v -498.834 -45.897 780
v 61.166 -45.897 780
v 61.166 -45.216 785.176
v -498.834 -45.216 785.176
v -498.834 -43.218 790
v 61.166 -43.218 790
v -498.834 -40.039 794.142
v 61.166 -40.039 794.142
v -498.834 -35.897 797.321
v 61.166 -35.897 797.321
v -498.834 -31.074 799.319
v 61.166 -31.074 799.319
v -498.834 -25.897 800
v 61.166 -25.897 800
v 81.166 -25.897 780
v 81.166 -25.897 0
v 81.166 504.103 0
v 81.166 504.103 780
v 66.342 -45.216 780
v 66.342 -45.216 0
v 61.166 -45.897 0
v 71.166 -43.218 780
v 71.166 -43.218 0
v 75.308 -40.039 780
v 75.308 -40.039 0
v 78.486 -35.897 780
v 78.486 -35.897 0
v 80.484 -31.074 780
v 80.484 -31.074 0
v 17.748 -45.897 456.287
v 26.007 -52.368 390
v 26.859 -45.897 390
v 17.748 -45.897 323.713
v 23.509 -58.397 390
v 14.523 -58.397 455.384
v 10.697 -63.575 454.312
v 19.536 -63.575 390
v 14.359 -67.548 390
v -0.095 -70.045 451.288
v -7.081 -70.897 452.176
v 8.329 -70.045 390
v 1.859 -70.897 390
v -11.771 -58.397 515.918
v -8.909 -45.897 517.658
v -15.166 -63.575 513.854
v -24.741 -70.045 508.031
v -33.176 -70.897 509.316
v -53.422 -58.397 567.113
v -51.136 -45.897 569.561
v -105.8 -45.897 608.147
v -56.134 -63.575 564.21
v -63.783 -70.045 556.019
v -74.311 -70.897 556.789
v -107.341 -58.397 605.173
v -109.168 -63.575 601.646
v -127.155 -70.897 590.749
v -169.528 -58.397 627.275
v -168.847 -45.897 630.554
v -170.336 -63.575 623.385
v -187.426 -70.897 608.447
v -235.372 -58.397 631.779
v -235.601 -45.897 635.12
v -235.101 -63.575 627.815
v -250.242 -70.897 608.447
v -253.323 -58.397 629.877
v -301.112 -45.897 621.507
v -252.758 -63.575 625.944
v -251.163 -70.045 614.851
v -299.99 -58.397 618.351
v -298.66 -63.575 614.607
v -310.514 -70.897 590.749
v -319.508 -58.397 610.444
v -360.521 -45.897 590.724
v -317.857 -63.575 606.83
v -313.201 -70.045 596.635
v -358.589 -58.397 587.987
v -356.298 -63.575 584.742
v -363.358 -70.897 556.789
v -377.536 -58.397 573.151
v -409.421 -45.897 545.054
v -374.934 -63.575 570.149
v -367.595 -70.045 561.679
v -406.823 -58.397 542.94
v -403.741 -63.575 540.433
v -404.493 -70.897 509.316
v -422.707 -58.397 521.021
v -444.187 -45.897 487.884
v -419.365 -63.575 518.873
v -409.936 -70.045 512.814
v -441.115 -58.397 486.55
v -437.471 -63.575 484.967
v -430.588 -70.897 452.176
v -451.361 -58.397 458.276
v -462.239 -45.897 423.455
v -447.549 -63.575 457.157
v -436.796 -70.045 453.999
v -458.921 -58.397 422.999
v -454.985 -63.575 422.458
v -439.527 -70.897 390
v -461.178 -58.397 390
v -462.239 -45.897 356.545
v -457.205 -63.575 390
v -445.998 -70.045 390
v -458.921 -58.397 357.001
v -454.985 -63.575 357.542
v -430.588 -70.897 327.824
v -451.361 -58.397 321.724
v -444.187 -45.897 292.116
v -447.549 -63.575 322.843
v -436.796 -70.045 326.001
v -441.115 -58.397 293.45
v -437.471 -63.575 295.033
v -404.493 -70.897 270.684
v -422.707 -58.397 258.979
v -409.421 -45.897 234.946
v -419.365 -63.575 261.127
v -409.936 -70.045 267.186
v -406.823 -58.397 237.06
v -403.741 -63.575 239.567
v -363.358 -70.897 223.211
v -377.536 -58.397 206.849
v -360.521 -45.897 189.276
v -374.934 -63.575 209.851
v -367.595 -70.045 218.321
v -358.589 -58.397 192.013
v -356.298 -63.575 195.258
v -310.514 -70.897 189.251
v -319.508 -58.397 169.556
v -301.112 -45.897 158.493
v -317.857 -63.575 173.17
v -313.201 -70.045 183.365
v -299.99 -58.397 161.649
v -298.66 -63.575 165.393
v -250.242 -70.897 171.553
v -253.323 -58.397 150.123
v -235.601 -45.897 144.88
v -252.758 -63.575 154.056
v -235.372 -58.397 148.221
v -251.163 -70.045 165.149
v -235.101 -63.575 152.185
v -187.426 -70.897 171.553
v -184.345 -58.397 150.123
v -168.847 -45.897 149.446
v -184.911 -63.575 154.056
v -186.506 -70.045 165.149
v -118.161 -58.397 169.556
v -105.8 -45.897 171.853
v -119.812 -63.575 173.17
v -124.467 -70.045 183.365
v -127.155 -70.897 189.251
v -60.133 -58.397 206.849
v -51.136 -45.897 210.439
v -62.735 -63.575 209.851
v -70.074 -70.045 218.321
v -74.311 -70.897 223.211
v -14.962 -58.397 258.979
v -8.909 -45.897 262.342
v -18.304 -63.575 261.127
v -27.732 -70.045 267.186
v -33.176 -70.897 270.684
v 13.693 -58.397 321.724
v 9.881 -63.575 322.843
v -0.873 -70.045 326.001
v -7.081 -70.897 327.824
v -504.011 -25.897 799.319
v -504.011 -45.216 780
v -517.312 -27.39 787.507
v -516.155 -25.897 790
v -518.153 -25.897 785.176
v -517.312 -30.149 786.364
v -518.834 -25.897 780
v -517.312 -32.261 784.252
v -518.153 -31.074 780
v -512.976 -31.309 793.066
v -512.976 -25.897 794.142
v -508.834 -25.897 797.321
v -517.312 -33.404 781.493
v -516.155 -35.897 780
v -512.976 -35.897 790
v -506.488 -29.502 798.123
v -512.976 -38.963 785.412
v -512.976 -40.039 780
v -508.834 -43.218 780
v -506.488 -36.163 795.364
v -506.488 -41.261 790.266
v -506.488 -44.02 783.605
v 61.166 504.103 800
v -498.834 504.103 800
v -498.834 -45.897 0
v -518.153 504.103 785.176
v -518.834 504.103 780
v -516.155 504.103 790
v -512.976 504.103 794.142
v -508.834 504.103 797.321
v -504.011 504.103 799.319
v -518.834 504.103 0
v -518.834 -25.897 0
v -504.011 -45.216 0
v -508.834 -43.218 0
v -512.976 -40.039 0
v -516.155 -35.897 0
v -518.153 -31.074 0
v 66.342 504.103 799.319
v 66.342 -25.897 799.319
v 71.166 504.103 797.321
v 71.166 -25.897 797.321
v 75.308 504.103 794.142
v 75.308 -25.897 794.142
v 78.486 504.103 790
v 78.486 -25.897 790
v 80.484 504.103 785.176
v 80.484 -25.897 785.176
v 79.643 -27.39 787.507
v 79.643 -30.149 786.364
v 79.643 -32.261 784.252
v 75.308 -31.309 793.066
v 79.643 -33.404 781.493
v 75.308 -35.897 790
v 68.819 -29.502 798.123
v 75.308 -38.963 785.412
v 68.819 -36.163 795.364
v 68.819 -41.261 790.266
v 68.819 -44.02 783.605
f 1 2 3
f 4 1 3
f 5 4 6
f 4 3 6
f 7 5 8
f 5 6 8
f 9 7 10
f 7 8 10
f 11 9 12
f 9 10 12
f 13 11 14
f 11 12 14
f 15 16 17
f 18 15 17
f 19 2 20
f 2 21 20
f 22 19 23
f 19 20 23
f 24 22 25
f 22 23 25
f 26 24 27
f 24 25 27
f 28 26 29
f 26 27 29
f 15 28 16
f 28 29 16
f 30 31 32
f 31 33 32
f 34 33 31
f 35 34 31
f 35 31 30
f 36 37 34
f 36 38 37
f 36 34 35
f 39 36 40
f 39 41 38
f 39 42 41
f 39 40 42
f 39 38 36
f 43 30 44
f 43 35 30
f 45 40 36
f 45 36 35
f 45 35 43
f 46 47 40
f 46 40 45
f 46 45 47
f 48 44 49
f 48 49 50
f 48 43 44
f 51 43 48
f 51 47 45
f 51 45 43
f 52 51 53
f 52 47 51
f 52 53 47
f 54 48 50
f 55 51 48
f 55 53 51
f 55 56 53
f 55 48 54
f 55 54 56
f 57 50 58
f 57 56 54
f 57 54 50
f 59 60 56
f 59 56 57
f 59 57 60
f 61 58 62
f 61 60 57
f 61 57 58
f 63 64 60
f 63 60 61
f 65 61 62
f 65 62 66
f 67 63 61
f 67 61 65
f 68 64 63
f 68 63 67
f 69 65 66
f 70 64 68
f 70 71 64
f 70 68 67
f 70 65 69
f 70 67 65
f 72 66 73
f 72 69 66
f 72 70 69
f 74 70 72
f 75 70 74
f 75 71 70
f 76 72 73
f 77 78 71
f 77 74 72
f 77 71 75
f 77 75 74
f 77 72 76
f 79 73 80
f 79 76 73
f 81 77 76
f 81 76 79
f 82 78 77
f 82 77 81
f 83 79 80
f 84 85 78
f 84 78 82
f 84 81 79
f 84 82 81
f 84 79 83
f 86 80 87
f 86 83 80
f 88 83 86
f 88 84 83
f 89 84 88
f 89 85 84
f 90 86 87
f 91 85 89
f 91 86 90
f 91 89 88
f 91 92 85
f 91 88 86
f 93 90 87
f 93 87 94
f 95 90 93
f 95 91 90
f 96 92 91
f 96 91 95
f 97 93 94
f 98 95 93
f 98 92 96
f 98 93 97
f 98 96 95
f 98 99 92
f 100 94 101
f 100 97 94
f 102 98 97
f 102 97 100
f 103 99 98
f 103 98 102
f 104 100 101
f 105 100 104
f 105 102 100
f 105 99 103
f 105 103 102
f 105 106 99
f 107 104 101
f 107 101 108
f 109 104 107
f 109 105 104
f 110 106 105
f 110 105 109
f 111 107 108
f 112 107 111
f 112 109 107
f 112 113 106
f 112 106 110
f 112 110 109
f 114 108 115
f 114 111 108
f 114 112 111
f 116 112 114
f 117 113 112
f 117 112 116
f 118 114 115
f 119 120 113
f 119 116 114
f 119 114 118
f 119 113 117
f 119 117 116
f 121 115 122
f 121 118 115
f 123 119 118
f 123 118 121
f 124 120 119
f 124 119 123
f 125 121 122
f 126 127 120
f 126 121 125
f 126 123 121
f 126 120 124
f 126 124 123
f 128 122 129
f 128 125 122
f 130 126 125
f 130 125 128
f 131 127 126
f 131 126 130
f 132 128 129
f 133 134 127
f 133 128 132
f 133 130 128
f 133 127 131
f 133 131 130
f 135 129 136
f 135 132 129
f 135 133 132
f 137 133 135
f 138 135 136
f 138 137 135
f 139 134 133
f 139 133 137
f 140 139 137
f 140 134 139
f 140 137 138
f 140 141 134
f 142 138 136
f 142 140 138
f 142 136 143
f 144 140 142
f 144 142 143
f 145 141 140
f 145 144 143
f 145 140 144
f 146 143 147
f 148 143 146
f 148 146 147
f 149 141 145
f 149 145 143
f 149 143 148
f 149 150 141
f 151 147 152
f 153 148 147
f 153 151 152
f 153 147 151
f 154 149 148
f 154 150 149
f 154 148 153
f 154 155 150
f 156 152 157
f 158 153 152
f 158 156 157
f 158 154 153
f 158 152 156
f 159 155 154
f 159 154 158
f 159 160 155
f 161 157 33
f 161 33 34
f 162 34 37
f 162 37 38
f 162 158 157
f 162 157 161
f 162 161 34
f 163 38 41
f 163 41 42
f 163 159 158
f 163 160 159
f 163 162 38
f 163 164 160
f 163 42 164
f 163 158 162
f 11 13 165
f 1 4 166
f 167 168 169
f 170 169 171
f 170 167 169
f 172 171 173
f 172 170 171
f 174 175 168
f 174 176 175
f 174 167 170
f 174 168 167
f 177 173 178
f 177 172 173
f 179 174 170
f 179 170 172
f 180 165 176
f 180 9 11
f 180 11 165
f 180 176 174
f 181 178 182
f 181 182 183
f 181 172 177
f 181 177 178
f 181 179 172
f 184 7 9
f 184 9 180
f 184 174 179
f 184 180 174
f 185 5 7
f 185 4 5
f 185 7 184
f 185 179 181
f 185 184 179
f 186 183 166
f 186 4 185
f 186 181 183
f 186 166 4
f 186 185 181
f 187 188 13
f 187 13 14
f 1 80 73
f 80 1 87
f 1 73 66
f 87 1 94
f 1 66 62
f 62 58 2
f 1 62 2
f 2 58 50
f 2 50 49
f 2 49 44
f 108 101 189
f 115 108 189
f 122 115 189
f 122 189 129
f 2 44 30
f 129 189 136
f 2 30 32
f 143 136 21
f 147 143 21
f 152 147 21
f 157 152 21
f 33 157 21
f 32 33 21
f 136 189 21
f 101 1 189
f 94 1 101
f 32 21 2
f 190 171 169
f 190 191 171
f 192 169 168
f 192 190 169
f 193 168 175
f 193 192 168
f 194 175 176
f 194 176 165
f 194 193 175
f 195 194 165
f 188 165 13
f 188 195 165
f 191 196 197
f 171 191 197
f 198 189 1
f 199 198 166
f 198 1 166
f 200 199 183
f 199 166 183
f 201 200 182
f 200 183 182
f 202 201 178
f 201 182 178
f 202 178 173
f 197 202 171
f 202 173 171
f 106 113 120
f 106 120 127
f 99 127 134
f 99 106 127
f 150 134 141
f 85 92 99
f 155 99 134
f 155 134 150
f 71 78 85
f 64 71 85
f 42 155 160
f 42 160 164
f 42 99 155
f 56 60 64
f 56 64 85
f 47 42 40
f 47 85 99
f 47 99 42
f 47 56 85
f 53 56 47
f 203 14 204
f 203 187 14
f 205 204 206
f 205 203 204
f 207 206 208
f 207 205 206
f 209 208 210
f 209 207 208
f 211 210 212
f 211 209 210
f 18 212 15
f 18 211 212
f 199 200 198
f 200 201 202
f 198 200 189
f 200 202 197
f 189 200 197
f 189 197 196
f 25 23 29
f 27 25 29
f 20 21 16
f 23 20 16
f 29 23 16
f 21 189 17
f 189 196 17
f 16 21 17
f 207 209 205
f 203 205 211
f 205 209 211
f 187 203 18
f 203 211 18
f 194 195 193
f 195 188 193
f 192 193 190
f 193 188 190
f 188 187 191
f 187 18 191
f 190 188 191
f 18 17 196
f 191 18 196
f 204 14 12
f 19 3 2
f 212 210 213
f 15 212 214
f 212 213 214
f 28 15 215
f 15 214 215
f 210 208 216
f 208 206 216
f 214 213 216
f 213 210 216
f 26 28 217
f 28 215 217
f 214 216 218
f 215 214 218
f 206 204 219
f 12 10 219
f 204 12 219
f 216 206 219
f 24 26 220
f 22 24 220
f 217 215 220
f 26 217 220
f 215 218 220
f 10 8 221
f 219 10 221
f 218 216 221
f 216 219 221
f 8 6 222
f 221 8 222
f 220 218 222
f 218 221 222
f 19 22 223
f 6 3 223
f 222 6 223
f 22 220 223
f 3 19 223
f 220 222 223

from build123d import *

# Parameters (mm, degrees)
F2_DEPTH = 700
F1_W     = 600
F1_H     = 550
F3_DEPTH = 800
F4_R     = 20
F5_R     = 245.6930164014
F6_DEPTH = 25
F7_R     = 24.99999


# Not quite as in the source:
# - a fillet or chamfer is up to 0.001 mm smaller than in the source, because OpenCascade refuses the exact size


with BuildPart() as f2:
    # F0 (on Top) → F2 (new body)
    with BuildSketch(Plane.XY):
        Polygon((81.1656415462, 504.1027583182), (-518.8343584538, 504.1027583182), (-518.8343584538, -45.8972416818), (-500.8343584538, -45.8972416818), (-500.8343584538, 501.1027583182), (63.1656415462, 501.1027583182), (63.1656415462, -45.8972416818), (81.1656415462, -45.8972416818), align=None)
    extrude(amount=F2_DEPTH)

    # F1 (on Top) → F3 (join)
    with BuildSketch(Plane.XY):
        with Locations((-218.8343584538, 229.1027583182)):
            Rectangle(F1_W, F1_H)
    extrude(amount=F3_DEPTH)

    # F4
    f4_edges = [f2.edges().sort_by_distance(p)[0] for p in [
        (-218.834358, -45.897242, 800),
        (81.165642, 229.102758, 800),
        (-518.834358, 229.102758, 800),
        (81.165642, -45.897242, 400),
        (-518.834358, -45.897242, 400),
    ]]
    fillet(f4_edges, radius=F4_R)

    # F5 (on face) → F6 (join)
    with BuildSketch(Plane.XZ.offset(45.8972416818)):
        with Locations((-218.8343584538, 390)):
            Circle(F5_R)
    extrude(amount=F6_DEPTH)

    # F7 (radius 25 in the source; OpenCascade refuses exactly that, so slightly less here)
    f7_edges = [f2.edges().sort_by_distance(p)[0] for p in [
        (-464.527375, -70.897242, 390),
    ]]
    fillet(f7_edges, radius=F7_R)


solid = f2.part
